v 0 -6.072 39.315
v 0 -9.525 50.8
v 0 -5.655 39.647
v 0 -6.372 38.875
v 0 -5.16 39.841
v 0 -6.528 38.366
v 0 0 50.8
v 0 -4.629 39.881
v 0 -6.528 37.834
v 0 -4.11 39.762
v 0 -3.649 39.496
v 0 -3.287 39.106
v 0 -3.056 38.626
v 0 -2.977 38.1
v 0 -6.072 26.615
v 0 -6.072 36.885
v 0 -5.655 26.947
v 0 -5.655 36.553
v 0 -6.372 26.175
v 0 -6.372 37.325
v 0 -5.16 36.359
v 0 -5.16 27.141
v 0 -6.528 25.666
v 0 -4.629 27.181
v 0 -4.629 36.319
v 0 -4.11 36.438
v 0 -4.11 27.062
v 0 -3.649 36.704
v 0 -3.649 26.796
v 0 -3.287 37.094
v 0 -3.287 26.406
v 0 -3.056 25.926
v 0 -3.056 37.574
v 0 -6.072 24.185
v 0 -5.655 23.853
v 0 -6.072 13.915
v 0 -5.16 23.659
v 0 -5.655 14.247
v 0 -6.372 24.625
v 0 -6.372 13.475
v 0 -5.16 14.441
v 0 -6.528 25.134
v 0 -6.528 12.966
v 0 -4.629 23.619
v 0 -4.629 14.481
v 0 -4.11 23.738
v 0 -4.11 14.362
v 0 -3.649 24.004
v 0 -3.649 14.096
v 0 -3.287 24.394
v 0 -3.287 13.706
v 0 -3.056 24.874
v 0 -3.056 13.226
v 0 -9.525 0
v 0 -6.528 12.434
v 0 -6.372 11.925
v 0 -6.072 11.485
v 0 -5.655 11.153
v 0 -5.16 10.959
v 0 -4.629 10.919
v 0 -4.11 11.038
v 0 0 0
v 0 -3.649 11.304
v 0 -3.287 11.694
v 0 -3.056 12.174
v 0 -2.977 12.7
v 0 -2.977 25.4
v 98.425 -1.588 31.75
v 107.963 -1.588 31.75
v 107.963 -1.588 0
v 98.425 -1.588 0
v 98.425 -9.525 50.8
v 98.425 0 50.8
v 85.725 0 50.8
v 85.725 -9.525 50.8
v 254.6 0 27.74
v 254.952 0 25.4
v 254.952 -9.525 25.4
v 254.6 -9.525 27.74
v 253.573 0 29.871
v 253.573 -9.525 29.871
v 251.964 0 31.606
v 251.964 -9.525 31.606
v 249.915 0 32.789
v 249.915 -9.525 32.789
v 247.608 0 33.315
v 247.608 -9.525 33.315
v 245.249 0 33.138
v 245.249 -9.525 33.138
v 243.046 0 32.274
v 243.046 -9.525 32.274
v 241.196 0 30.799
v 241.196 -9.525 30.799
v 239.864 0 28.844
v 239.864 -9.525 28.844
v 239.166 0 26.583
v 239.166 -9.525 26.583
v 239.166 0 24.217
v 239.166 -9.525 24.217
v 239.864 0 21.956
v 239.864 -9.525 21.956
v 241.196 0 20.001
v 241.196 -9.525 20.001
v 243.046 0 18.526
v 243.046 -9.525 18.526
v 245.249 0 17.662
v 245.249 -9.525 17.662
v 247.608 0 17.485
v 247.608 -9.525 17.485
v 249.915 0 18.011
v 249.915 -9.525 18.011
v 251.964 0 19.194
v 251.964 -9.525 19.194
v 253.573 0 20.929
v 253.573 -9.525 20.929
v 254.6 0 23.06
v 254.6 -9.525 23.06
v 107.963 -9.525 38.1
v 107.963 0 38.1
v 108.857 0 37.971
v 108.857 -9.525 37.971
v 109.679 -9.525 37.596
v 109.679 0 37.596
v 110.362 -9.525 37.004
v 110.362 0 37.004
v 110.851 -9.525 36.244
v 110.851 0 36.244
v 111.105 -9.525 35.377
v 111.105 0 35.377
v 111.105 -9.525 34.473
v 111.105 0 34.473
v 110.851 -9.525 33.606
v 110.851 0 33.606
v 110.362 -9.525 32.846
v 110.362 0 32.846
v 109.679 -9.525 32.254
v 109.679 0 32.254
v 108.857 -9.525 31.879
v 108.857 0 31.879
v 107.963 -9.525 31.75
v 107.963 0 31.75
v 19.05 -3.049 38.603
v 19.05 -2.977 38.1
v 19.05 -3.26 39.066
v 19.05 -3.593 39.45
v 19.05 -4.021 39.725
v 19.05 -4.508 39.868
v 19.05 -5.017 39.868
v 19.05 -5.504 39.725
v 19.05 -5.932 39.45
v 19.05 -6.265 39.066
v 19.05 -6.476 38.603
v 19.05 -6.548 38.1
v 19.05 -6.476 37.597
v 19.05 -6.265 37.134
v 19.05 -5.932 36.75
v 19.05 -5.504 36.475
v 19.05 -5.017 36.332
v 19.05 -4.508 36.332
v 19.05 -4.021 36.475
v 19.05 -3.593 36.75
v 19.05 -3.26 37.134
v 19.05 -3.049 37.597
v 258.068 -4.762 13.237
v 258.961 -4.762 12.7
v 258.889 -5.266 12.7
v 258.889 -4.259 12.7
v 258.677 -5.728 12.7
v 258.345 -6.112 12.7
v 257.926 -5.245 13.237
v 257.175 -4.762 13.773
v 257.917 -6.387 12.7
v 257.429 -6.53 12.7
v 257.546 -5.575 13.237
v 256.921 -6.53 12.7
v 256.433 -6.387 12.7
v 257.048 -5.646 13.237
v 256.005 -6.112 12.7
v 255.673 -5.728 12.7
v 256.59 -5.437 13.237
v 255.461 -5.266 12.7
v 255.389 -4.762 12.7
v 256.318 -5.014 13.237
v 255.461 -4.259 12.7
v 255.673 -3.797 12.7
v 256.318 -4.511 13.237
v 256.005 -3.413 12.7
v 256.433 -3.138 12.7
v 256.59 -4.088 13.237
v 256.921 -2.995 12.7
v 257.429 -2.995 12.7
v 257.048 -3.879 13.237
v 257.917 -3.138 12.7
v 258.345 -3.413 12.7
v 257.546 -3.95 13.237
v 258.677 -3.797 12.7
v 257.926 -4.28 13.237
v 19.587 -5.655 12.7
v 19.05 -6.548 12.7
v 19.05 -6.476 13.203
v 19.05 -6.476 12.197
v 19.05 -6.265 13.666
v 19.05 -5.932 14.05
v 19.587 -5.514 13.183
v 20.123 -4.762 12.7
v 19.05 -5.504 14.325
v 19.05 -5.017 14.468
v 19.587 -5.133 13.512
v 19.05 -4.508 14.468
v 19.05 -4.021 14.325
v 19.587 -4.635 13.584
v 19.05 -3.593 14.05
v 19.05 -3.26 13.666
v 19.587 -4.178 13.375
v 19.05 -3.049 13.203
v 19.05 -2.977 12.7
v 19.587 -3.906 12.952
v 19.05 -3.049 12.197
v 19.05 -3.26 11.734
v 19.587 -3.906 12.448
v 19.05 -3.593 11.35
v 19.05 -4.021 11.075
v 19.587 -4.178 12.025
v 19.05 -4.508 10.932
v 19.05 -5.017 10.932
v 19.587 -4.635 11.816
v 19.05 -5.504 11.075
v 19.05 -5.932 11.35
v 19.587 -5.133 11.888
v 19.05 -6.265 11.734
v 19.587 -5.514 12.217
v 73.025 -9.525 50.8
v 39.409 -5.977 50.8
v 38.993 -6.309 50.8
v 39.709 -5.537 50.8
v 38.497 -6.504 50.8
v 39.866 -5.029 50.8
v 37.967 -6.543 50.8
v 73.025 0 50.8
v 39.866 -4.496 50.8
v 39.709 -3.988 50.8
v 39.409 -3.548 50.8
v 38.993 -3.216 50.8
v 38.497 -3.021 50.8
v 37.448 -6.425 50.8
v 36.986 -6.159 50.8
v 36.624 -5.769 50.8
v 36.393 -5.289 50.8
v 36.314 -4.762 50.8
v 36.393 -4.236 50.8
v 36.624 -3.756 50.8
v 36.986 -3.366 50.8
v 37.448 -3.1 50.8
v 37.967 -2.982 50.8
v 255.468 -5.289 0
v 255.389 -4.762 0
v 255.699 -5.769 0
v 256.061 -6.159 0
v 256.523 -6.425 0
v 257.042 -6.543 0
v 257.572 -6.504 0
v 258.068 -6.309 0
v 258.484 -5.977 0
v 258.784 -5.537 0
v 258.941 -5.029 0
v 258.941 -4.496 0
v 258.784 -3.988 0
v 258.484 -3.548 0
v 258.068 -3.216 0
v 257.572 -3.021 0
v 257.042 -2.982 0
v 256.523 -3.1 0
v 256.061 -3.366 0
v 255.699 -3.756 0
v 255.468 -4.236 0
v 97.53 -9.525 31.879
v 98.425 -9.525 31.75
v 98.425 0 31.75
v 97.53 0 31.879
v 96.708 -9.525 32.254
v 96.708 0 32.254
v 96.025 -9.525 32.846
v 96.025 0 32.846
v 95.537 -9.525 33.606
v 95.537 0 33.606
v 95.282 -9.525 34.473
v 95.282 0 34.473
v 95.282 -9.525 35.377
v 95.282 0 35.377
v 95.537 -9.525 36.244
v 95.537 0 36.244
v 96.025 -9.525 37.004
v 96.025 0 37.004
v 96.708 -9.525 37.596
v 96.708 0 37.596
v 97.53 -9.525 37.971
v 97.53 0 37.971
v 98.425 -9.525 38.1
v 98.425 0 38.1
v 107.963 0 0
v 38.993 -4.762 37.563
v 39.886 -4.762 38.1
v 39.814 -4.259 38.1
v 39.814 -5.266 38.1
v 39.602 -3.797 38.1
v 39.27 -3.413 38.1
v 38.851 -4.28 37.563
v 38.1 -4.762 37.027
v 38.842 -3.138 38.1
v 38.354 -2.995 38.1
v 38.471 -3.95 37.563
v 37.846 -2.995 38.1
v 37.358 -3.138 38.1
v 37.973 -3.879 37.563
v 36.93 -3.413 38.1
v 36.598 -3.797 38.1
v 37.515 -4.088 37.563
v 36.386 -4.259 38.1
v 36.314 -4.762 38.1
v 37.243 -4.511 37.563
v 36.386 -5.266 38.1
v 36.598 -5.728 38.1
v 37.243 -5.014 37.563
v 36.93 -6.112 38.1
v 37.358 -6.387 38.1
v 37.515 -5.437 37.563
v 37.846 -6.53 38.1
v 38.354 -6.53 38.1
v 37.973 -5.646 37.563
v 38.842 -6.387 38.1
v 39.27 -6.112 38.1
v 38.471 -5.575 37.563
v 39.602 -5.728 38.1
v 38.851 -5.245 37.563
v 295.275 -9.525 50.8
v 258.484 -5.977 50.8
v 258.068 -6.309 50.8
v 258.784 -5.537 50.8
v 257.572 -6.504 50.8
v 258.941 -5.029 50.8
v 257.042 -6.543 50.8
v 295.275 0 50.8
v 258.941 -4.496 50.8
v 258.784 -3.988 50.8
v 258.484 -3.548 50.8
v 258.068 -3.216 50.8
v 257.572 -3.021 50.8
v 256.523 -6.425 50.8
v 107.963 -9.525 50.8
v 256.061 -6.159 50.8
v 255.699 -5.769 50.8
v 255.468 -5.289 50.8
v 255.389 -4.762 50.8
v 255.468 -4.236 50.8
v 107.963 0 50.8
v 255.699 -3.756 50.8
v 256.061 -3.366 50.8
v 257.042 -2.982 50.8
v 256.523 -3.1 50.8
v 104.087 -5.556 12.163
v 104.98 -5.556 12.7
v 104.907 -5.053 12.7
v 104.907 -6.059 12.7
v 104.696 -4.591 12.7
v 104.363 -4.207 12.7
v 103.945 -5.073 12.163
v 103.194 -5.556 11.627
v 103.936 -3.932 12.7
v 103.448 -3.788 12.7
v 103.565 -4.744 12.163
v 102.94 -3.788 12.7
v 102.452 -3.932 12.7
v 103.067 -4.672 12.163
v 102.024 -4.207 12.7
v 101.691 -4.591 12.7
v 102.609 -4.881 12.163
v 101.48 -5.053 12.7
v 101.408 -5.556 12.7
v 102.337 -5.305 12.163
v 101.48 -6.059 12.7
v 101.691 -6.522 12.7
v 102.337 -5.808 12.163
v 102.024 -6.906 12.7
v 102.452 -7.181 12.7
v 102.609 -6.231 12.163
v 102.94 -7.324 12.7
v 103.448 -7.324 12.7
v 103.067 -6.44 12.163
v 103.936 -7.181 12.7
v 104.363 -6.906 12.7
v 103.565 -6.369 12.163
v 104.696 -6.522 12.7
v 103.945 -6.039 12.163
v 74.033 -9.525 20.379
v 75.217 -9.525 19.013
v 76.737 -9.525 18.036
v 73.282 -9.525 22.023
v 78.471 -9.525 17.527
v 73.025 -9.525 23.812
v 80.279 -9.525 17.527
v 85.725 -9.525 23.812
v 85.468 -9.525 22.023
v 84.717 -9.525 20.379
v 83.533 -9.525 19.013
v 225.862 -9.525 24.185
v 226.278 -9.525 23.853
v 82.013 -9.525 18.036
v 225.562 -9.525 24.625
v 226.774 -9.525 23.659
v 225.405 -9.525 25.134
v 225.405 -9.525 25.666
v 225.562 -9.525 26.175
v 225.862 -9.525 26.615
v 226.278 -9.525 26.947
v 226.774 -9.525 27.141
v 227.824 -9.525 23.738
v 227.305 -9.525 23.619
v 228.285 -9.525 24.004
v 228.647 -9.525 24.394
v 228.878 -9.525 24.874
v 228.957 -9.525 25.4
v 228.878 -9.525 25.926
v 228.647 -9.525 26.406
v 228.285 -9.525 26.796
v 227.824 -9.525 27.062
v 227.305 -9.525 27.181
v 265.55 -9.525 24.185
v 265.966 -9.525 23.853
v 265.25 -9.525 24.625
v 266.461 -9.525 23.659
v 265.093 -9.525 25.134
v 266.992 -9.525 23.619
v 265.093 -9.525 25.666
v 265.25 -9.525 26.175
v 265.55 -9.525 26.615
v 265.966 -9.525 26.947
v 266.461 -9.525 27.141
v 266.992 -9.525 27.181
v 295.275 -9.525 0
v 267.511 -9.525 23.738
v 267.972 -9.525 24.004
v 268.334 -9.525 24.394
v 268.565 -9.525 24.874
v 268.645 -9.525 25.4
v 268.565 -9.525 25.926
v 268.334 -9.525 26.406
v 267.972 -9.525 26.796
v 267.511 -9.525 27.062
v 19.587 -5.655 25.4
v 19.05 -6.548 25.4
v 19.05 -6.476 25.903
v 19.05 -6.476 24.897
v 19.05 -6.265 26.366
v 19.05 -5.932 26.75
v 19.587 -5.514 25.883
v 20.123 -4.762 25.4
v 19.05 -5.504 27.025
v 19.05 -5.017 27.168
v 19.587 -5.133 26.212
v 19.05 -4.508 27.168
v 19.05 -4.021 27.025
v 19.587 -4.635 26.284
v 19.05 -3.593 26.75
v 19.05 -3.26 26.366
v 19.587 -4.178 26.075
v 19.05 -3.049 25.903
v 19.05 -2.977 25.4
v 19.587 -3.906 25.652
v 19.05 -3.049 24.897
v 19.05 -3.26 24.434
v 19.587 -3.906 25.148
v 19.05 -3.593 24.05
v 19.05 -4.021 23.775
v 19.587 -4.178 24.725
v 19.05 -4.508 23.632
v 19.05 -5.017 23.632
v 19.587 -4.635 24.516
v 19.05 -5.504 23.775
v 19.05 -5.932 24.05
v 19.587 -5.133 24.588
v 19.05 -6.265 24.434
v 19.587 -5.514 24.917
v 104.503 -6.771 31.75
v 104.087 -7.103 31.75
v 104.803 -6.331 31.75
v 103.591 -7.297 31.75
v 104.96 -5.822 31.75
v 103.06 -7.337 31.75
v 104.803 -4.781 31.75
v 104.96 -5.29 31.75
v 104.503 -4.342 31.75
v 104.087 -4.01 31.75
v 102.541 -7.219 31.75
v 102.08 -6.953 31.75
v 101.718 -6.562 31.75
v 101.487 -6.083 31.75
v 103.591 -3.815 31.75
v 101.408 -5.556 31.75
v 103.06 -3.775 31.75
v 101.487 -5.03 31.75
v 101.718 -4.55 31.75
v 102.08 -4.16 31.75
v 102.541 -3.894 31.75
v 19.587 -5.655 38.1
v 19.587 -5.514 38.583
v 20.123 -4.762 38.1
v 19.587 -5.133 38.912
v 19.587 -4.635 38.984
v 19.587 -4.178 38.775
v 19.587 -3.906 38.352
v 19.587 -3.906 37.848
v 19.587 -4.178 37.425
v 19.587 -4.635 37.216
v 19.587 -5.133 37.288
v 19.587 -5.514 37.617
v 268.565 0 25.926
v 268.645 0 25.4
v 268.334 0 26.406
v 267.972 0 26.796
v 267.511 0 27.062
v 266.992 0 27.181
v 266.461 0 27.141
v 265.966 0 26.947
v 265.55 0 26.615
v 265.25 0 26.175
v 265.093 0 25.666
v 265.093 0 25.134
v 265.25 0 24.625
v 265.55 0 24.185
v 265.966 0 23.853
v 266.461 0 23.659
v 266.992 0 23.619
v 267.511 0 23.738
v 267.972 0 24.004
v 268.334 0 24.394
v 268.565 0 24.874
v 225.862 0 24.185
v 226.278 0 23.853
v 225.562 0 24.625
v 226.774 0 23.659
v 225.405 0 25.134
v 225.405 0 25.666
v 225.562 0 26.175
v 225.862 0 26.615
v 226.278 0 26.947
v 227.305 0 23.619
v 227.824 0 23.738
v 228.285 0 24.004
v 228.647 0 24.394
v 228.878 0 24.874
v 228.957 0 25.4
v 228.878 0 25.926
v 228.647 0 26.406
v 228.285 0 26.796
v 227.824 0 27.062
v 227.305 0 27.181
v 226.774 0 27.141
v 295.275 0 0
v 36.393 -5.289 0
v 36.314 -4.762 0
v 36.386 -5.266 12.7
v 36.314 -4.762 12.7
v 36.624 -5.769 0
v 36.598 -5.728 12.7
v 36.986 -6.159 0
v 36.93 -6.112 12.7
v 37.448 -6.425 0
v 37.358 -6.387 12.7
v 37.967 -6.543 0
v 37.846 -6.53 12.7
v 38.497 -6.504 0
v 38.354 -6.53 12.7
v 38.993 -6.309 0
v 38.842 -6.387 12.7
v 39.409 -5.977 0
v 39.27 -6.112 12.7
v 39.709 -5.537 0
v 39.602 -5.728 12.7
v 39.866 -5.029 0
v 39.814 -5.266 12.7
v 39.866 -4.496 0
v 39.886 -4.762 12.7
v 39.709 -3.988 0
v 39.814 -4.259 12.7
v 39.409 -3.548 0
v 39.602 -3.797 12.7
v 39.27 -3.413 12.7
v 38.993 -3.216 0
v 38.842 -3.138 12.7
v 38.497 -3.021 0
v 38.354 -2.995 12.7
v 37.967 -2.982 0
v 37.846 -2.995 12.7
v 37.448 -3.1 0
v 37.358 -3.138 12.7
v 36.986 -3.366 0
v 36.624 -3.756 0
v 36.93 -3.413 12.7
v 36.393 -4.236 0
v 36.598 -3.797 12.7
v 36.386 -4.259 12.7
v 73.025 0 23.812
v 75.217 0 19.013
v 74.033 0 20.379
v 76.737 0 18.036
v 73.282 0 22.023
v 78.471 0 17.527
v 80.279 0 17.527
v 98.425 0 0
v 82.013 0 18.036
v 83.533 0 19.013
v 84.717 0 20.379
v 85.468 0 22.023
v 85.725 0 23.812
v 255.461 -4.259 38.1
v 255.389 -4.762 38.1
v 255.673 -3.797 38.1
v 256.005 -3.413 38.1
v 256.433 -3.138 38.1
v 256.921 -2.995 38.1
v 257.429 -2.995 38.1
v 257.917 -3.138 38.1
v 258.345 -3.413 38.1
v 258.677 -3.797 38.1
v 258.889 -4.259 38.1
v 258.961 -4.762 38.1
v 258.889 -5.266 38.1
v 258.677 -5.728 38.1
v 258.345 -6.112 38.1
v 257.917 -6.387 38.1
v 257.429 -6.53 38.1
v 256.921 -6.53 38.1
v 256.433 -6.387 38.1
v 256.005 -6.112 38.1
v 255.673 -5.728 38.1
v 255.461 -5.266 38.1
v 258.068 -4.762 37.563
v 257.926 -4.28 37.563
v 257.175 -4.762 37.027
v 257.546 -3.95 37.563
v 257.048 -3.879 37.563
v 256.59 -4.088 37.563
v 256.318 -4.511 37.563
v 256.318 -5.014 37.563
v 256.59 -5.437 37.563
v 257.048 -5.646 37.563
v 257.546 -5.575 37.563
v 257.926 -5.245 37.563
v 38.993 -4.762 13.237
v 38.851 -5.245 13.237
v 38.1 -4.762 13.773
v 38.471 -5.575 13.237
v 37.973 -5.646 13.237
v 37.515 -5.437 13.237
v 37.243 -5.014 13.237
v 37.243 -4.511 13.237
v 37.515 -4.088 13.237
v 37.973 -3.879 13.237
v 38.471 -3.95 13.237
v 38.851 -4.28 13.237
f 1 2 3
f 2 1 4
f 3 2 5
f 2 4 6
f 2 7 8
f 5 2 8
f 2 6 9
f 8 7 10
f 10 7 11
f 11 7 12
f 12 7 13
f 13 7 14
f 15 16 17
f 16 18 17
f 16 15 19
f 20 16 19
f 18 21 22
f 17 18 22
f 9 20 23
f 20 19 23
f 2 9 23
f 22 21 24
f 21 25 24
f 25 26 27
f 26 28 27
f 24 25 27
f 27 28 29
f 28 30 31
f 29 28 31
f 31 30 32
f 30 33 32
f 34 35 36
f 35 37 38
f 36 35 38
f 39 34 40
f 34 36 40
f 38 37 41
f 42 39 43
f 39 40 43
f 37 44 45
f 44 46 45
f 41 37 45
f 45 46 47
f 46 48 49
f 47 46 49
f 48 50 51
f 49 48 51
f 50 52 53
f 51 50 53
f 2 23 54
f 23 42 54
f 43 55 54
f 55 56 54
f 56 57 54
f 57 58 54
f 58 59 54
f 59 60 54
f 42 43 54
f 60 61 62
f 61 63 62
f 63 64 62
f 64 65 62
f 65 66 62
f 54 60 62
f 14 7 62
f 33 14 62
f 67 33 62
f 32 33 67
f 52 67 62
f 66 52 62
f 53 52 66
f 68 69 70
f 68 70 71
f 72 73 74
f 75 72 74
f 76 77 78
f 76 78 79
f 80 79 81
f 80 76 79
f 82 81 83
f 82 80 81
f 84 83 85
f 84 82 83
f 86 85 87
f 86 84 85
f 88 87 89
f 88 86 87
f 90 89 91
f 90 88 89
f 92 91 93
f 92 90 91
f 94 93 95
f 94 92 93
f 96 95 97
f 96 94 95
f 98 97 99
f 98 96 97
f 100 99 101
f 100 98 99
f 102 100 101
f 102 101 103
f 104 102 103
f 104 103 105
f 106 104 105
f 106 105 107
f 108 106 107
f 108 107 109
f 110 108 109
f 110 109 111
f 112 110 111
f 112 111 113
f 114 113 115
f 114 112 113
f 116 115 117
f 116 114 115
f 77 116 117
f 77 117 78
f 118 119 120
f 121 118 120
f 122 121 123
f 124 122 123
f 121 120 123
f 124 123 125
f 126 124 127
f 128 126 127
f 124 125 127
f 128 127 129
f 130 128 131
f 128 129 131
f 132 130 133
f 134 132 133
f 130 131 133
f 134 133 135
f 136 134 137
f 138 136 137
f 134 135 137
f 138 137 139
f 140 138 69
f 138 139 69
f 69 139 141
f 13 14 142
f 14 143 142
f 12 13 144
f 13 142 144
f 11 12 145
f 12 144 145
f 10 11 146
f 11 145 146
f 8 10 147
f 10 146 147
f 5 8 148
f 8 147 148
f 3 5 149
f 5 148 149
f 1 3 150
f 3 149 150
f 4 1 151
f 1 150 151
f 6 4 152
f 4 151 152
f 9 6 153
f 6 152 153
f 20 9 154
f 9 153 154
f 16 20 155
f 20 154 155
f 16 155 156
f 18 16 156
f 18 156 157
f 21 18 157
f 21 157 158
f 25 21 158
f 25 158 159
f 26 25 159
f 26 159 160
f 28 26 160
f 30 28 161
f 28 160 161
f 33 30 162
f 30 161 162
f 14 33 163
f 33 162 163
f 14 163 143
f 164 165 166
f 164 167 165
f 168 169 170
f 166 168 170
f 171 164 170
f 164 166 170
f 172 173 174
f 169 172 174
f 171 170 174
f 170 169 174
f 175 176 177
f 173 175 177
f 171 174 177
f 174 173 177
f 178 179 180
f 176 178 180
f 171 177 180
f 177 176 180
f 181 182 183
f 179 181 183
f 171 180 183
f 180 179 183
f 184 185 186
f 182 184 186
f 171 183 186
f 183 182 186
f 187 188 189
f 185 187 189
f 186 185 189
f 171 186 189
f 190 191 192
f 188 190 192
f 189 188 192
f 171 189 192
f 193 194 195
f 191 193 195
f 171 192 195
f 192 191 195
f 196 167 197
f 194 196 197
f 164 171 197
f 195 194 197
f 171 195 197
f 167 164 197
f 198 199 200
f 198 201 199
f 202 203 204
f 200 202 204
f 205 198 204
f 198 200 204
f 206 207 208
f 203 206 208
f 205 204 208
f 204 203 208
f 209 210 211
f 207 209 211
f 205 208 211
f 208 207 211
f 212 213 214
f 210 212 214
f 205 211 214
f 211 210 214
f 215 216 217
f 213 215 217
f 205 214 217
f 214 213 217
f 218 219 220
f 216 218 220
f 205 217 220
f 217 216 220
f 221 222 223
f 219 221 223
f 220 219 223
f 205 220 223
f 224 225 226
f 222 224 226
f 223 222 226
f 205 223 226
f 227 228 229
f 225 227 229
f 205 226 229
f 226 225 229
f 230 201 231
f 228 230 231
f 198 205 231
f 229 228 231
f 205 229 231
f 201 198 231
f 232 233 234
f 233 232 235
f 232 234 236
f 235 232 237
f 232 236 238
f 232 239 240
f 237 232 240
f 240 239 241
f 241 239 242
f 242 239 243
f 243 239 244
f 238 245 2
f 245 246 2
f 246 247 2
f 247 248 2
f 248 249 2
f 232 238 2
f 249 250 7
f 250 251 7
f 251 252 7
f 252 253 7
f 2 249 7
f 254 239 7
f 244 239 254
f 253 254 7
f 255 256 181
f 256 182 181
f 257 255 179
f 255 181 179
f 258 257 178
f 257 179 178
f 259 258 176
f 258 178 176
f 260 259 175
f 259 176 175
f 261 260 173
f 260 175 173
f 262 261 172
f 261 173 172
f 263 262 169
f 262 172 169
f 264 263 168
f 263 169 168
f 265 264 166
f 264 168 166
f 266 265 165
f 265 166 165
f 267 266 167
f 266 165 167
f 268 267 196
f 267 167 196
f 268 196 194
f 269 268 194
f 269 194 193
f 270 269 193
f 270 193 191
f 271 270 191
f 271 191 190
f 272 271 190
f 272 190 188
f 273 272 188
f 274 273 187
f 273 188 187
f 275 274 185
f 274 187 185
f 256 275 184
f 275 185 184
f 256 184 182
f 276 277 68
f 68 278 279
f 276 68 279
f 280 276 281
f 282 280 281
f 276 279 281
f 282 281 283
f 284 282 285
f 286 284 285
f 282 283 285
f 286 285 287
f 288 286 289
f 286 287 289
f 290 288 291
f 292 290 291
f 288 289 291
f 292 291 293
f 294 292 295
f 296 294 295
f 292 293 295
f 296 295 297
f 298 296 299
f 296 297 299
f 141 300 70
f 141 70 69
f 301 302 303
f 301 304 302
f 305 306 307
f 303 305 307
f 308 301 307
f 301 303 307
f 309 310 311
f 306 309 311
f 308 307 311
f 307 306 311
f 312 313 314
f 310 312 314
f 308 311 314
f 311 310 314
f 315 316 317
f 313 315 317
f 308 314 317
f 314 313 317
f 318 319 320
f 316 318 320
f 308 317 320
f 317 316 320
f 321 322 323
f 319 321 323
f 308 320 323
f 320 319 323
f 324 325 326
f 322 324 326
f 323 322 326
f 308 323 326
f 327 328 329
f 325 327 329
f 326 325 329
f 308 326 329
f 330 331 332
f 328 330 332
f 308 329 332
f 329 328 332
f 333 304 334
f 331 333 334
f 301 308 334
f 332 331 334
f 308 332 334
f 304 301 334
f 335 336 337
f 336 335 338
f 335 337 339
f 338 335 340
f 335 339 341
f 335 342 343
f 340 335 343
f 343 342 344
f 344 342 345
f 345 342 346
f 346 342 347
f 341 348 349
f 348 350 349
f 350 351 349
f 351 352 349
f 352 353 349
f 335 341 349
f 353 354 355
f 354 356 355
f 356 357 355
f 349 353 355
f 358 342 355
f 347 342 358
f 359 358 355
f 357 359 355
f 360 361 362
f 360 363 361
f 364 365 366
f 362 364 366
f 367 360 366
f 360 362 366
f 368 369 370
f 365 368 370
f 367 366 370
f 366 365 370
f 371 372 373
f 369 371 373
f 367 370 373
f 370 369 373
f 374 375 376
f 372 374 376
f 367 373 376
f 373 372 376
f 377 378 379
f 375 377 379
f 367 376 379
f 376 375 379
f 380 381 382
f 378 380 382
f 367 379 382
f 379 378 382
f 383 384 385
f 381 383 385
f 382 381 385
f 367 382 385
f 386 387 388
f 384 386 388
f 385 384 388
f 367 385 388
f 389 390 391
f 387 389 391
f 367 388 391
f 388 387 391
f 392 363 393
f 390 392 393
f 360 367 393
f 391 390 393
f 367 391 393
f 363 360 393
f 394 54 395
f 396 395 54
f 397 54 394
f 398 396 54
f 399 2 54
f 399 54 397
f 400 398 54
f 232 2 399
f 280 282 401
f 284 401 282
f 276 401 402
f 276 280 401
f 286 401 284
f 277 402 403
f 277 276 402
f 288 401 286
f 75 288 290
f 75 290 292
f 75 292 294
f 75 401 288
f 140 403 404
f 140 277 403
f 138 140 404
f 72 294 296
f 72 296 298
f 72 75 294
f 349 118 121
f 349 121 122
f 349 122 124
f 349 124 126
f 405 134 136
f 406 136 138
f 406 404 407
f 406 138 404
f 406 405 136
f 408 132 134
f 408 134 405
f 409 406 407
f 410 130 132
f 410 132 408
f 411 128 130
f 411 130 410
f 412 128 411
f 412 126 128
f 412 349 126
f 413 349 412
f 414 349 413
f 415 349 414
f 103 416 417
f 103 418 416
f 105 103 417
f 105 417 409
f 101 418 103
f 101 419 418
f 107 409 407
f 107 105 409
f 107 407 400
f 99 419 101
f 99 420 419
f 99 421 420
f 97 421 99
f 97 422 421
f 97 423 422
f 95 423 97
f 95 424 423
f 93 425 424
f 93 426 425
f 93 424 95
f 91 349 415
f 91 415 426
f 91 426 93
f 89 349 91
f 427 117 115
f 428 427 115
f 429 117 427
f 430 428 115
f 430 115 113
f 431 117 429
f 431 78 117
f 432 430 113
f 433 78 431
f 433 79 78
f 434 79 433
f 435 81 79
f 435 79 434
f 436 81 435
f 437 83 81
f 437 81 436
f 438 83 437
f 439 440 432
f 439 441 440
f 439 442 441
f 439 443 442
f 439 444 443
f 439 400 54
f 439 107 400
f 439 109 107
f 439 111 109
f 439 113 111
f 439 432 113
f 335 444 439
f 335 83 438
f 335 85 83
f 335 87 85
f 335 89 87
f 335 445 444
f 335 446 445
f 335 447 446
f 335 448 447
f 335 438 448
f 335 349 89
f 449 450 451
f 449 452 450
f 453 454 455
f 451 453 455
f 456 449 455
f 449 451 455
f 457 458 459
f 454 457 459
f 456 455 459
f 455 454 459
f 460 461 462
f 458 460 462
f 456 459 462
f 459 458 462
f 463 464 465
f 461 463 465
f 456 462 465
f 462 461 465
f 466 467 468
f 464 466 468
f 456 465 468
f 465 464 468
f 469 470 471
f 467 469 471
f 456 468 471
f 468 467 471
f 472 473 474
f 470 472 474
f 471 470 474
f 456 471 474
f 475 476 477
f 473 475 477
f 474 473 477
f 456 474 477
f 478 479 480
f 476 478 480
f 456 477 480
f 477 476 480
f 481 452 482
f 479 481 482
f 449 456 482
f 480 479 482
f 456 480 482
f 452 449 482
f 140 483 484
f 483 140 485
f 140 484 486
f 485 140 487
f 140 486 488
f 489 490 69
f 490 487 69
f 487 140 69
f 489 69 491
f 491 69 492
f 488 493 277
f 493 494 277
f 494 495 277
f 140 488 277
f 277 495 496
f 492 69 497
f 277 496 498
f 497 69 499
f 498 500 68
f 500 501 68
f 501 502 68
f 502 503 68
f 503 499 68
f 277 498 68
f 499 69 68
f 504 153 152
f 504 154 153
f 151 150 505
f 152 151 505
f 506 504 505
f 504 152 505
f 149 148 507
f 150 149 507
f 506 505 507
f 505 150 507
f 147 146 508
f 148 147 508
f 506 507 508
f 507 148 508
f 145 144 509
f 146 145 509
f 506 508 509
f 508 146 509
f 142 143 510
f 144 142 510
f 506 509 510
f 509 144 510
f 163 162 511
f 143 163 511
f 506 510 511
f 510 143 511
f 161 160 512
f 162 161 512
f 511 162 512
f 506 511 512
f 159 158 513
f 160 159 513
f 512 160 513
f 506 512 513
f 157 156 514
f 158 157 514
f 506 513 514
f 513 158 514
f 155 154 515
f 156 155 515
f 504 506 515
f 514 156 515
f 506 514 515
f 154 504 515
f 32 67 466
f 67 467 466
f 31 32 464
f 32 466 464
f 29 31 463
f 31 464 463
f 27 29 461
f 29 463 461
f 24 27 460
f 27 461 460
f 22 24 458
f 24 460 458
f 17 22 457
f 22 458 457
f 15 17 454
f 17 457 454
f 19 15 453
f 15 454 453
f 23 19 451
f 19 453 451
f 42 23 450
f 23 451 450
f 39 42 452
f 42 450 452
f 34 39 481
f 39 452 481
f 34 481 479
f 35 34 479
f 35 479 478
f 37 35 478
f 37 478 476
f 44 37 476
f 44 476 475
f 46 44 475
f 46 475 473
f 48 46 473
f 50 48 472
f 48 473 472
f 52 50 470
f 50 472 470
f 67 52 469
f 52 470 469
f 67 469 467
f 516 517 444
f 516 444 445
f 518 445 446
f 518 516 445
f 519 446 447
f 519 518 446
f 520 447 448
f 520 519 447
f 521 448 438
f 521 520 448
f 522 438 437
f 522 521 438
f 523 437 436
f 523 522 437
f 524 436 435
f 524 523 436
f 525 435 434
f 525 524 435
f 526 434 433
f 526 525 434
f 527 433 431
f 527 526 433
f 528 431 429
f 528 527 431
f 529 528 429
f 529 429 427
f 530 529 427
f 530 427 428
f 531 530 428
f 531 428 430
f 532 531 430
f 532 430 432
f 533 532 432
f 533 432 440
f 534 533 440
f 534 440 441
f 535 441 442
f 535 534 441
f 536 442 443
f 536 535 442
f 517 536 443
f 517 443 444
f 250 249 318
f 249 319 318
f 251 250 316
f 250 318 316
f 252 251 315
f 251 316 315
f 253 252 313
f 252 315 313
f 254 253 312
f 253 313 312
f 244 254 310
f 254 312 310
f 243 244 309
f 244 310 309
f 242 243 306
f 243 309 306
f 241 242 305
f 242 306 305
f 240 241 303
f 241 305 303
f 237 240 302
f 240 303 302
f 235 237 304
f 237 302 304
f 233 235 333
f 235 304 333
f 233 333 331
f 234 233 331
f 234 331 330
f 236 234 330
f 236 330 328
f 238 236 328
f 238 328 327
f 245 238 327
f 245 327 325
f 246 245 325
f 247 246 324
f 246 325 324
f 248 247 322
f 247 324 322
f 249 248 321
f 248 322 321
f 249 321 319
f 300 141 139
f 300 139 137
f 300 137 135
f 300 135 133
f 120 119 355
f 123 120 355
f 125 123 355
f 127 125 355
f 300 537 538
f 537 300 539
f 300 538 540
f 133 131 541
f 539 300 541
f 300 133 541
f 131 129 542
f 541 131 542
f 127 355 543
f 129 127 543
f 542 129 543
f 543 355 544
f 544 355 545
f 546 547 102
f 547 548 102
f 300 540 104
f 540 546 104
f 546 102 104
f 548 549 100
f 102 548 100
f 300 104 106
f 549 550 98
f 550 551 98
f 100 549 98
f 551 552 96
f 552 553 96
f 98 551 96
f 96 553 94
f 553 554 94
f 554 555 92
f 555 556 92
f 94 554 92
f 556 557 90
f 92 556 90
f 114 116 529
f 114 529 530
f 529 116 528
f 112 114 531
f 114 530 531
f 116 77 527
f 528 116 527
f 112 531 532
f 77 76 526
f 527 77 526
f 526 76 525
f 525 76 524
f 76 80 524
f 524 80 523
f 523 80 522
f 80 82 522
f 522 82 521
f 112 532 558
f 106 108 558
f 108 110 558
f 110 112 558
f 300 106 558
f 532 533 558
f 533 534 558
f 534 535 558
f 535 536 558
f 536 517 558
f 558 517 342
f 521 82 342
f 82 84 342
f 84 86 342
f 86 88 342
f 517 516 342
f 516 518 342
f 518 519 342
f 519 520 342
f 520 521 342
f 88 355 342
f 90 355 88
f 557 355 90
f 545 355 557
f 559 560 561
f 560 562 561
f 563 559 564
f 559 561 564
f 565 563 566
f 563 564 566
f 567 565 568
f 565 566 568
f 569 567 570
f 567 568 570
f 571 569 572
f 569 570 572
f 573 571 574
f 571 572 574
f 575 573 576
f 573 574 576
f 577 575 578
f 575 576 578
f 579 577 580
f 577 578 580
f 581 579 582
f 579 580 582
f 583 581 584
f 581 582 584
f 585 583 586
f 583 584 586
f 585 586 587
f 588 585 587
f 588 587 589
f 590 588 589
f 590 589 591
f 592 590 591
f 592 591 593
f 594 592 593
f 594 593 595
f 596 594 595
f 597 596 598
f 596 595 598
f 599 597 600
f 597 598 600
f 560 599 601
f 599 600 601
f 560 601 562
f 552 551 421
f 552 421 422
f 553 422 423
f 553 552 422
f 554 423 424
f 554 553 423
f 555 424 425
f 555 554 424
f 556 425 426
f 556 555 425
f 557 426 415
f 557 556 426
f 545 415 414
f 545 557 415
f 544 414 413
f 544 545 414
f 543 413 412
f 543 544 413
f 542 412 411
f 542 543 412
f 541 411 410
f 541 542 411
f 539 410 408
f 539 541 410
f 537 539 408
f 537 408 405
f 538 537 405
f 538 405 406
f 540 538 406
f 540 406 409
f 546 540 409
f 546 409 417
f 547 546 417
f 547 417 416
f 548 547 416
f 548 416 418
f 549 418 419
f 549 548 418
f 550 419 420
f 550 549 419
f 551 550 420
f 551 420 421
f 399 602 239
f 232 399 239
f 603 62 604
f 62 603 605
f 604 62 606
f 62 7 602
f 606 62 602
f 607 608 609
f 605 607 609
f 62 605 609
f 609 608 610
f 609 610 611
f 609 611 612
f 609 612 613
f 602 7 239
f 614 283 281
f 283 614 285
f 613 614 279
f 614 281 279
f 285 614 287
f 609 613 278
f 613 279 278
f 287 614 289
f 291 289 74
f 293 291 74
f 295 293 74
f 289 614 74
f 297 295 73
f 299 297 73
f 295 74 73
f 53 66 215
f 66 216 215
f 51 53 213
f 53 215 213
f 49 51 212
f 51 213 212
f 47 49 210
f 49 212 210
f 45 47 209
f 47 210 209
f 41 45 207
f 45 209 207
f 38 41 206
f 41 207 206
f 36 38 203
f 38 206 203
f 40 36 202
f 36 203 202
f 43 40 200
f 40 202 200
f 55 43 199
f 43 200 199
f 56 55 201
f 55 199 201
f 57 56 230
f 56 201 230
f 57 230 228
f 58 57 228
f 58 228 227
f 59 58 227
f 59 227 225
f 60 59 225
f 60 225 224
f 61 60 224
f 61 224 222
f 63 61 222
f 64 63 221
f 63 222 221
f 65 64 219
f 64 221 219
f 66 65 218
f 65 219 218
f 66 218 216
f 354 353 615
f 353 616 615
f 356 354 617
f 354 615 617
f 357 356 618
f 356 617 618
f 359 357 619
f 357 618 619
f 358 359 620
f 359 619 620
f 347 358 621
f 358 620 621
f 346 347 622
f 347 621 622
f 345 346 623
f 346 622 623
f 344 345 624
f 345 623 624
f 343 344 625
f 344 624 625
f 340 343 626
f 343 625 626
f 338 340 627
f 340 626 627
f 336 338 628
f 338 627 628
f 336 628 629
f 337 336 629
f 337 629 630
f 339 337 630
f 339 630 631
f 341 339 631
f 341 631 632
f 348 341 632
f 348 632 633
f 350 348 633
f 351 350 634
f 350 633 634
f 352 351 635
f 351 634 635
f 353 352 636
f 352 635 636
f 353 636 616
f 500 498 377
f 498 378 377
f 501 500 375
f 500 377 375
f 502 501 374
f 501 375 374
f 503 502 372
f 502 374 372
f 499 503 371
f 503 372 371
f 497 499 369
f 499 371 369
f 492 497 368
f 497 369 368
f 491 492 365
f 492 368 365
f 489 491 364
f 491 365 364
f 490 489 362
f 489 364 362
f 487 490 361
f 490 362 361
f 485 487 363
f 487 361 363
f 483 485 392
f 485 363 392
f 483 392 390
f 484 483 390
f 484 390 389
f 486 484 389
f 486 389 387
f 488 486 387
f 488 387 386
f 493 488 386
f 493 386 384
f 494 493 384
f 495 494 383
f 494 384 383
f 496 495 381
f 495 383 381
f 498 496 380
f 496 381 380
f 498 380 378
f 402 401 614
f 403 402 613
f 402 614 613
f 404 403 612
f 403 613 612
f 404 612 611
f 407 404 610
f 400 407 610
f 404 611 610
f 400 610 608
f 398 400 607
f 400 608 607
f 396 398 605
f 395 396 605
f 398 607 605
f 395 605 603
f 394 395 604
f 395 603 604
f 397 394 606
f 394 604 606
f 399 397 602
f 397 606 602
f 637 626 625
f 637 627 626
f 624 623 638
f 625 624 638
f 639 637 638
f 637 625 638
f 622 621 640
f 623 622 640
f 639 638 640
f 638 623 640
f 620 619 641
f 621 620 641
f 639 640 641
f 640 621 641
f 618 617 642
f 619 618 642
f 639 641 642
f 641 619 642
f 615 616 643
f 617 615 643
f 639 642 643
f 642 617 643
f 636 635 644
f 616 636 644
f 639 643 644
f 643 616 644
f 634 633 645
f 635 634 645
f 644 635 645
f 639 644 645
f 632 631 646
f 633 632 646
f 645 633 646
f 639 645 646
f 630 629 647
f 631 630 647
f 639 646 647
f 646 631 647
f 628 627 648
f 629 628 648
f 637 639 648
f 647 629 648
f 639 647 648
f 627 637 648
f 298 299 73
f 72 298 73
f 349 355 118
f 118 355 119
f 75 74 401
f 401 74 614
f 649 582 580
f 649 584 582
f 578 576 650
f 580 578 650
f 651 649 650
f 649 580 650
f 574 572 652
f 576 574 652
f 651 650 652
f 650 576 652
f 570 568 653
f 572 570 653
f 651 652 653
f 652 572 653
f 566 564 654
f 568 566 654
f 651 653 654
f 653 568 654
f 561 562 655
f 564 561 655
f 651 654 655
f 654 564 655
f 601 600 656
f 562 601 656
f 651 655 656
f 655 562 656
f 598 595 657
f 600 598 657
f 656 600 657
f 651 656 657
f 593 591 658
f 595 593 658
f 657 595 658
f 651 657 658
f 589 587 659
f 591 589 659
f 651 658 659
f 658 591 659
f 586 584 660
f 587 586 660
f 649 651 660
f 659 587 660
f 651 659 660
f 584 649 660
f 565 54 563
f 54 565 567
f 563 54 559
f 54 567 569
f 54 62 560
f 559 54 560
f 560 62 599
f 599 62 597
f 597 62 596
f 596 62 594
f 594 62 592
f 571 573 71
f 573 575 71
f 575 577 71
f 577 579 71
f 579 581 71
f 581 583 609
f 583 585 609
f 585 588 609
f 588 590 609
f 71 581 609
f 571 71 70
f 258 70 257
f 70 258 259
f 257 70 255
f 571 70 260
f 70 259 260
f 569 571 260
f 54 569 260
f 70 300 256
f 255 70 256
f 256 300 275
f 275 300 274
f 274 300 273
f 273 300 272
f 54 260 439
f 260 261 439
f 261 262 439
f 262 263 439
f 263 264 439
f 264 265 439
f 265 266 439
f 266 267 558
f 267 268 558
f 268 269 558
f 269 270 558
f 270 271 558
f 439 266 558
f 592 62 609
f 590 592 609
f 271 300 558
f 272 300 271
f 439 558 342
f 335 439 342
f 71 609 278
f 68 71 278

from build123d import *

# Parameters (mm, degrees)
F0_R             = 1.7859375
F0_R_2           = 7.9375
F1_DEPTH         = 9.525
F2_W             = 9.5377
F2_H             = 31.75
F3_DEPTH         = 1.5875
F5_D             = 3.571875
F5_DEPTH         = 19.05
F5_TIP           = 1.0730995118
F7_D             = 3.571875
F7_DEPTH         = 19.05
F7_TIP           = 1.0730995118
F11_D            = 3.571875
F11_DEPTH        = 12.7
F11_TIP          = 1.0730995118
F11_ON_F9_D      = 3.571875
F11_ON_F9_DEPTH  = 12.7
F11_ON_F9_TIP    = 1.0730995118
F11_ON_F10_D     = 3.571875
F11_ON_F10_DEPTH = 12.7
F11_ON_F10_TIP   = 1.0730995118


# Not quite as in the source:
# - a feature names something its author has since deleted; it is built from what else it names


with BuildPart() as f1:
    # F0 (on Front) → F1 (new body)
    with BuildSketch(Plane.XZ):
        with BuildLine():
            Line((0, 50.8), (0, 0))
            Line((0, 0), (295.275, 0))
            Line((295.275, 0), (295.275, 50.8))
            Line((295.275, 50.8), (107.9627, 50.8))
            Line((107.9627, 50.8), (107.9627, 38.1))
            ThreePointArc((107.9627, 38.1), (111.1377, 34.925), (107.9627, 31.75))
            Line((107.9627, 31.75), (98.425, 31.75))
            ThreePointArc((98.425, 31.75), (95.25, 34.925), (98.425, 38.1))
            Line((98.425, 38.1), (98.425, 50.8))
            Line((98.425, 50.8), (85.725, 50.8))
            Line((85.725, 50.8), (85.725, 23.8125))
            ThreePointArc((85.725, 23.8125), (79.375, 17.4625), (73.025, 23.8125))
            Line((73.025, 23.8125), (73.025, 50.8))
            Line((73.025, 50.8), (0, 50.8))
        make_face()
        with Locations((227.17125, 25.4)):
            Circle(F0_R, mode=Mode.SUBTRACT)
        with Locations((247.015, 25.4)):
            Circle(F0_R_2, mode=Mode.SUBTRACT)
        with Locations((266.85875, 25.4)):
            Circle(F0_R, mode=Mode.SUBTRACT)
    extrude(amount=F1_DEPTH)

    # F2 (on face) → F3 (cut)
    with BuildSketch(Plane(origin=(0, 0, 0), x_dir=(-1, 0, 0), z_dir=(0, 1, 0))):
        with Locations((-103.19385, 15.875)):
            Rectangle(F2_W, F2_H)
    extrude(amount=-F3_DEPTH, mode=Mode.SUBTRACT)

    # F5
    with Locations(Plane(origin=(0, 0, 0), x_dir=(0, -1, 0), z_dir=(-1, 0, 0))):
        with Locations((4.7625, 38.1), (4.7625, 25.4), (4.7625, 12.7)):
            Hole(F5_D / 2, depth=F5_DEPTH)
            with Locations((0, 0, -(F5_DEPTH + F5_TIP / 2))):  # 118° drill point
                Cone(0, F5_D / 2, F5_TIP, mode=Mode.SUBTRACT)

    # F7
    with Locations(Plane.XY.offset(31.75)):
        with Locations((103.19385, -5.55625)):
            Hole(F7_D / 2, depth=F7_DEPTH)
            with Locations((0, 0, -(F7_DEPTH + F7_TIP / 2))):  # 118° drill point
                Cone(0, F7_D / 2, F7_TIP, mode=Mode.SUBTRACT)

    # F11
    with Locations(Plane.XY.offset(50.8)):
        with Locations((257.175, -4.7625)):
            Hole(F11_D / 2, depth=F11_DEPTH)
            with Locations((0, 0, -(F11_DEPTH + F11_TIP / 2))):  # 118° drill point
                Cone(0, F11_D / 2, F11_TIP, mode=Mode.SUBTRACT)

    # F11 on F9
    with Locations(Plane.XY.offset(50.8)):
        with Locations((38.1, -4.7625)):
            Hole(F11_ON_F9_D / 2, depth=F11_ON_F9_DEPTH)
            with Locations((0, 0, -(F11_ON_F9_DEPTH + F11_ON_F9_TIP / 2))):  # 118° drill point
                Cone(0, F11_ON_F9_D / 2, F11_ON_F9_TIP, mode=Mode.SUBTRACT)

    # F11 on F10
    with Locations(Plane(origin=(0, 0, 0), x_dir=(1, 0, 0), z_dir=(0, 0, -1))):
        with Locations((38.1, 4.7625), (257.175, 4.7625)):
            Hole(F11_ON_F10_D / 2, depth=F11_ON_F10_DEPTH)
            with Locations((0, 0, -(F11_ON_F10_DEPTH + F11_ON_F10_TIP / 2))):  # 118° drill point
                Cone(0, F11_ON_F10_D / 2, F11_ON_F10_TIP, mode=Mode.SUBTRACT)


solid = f1.part
